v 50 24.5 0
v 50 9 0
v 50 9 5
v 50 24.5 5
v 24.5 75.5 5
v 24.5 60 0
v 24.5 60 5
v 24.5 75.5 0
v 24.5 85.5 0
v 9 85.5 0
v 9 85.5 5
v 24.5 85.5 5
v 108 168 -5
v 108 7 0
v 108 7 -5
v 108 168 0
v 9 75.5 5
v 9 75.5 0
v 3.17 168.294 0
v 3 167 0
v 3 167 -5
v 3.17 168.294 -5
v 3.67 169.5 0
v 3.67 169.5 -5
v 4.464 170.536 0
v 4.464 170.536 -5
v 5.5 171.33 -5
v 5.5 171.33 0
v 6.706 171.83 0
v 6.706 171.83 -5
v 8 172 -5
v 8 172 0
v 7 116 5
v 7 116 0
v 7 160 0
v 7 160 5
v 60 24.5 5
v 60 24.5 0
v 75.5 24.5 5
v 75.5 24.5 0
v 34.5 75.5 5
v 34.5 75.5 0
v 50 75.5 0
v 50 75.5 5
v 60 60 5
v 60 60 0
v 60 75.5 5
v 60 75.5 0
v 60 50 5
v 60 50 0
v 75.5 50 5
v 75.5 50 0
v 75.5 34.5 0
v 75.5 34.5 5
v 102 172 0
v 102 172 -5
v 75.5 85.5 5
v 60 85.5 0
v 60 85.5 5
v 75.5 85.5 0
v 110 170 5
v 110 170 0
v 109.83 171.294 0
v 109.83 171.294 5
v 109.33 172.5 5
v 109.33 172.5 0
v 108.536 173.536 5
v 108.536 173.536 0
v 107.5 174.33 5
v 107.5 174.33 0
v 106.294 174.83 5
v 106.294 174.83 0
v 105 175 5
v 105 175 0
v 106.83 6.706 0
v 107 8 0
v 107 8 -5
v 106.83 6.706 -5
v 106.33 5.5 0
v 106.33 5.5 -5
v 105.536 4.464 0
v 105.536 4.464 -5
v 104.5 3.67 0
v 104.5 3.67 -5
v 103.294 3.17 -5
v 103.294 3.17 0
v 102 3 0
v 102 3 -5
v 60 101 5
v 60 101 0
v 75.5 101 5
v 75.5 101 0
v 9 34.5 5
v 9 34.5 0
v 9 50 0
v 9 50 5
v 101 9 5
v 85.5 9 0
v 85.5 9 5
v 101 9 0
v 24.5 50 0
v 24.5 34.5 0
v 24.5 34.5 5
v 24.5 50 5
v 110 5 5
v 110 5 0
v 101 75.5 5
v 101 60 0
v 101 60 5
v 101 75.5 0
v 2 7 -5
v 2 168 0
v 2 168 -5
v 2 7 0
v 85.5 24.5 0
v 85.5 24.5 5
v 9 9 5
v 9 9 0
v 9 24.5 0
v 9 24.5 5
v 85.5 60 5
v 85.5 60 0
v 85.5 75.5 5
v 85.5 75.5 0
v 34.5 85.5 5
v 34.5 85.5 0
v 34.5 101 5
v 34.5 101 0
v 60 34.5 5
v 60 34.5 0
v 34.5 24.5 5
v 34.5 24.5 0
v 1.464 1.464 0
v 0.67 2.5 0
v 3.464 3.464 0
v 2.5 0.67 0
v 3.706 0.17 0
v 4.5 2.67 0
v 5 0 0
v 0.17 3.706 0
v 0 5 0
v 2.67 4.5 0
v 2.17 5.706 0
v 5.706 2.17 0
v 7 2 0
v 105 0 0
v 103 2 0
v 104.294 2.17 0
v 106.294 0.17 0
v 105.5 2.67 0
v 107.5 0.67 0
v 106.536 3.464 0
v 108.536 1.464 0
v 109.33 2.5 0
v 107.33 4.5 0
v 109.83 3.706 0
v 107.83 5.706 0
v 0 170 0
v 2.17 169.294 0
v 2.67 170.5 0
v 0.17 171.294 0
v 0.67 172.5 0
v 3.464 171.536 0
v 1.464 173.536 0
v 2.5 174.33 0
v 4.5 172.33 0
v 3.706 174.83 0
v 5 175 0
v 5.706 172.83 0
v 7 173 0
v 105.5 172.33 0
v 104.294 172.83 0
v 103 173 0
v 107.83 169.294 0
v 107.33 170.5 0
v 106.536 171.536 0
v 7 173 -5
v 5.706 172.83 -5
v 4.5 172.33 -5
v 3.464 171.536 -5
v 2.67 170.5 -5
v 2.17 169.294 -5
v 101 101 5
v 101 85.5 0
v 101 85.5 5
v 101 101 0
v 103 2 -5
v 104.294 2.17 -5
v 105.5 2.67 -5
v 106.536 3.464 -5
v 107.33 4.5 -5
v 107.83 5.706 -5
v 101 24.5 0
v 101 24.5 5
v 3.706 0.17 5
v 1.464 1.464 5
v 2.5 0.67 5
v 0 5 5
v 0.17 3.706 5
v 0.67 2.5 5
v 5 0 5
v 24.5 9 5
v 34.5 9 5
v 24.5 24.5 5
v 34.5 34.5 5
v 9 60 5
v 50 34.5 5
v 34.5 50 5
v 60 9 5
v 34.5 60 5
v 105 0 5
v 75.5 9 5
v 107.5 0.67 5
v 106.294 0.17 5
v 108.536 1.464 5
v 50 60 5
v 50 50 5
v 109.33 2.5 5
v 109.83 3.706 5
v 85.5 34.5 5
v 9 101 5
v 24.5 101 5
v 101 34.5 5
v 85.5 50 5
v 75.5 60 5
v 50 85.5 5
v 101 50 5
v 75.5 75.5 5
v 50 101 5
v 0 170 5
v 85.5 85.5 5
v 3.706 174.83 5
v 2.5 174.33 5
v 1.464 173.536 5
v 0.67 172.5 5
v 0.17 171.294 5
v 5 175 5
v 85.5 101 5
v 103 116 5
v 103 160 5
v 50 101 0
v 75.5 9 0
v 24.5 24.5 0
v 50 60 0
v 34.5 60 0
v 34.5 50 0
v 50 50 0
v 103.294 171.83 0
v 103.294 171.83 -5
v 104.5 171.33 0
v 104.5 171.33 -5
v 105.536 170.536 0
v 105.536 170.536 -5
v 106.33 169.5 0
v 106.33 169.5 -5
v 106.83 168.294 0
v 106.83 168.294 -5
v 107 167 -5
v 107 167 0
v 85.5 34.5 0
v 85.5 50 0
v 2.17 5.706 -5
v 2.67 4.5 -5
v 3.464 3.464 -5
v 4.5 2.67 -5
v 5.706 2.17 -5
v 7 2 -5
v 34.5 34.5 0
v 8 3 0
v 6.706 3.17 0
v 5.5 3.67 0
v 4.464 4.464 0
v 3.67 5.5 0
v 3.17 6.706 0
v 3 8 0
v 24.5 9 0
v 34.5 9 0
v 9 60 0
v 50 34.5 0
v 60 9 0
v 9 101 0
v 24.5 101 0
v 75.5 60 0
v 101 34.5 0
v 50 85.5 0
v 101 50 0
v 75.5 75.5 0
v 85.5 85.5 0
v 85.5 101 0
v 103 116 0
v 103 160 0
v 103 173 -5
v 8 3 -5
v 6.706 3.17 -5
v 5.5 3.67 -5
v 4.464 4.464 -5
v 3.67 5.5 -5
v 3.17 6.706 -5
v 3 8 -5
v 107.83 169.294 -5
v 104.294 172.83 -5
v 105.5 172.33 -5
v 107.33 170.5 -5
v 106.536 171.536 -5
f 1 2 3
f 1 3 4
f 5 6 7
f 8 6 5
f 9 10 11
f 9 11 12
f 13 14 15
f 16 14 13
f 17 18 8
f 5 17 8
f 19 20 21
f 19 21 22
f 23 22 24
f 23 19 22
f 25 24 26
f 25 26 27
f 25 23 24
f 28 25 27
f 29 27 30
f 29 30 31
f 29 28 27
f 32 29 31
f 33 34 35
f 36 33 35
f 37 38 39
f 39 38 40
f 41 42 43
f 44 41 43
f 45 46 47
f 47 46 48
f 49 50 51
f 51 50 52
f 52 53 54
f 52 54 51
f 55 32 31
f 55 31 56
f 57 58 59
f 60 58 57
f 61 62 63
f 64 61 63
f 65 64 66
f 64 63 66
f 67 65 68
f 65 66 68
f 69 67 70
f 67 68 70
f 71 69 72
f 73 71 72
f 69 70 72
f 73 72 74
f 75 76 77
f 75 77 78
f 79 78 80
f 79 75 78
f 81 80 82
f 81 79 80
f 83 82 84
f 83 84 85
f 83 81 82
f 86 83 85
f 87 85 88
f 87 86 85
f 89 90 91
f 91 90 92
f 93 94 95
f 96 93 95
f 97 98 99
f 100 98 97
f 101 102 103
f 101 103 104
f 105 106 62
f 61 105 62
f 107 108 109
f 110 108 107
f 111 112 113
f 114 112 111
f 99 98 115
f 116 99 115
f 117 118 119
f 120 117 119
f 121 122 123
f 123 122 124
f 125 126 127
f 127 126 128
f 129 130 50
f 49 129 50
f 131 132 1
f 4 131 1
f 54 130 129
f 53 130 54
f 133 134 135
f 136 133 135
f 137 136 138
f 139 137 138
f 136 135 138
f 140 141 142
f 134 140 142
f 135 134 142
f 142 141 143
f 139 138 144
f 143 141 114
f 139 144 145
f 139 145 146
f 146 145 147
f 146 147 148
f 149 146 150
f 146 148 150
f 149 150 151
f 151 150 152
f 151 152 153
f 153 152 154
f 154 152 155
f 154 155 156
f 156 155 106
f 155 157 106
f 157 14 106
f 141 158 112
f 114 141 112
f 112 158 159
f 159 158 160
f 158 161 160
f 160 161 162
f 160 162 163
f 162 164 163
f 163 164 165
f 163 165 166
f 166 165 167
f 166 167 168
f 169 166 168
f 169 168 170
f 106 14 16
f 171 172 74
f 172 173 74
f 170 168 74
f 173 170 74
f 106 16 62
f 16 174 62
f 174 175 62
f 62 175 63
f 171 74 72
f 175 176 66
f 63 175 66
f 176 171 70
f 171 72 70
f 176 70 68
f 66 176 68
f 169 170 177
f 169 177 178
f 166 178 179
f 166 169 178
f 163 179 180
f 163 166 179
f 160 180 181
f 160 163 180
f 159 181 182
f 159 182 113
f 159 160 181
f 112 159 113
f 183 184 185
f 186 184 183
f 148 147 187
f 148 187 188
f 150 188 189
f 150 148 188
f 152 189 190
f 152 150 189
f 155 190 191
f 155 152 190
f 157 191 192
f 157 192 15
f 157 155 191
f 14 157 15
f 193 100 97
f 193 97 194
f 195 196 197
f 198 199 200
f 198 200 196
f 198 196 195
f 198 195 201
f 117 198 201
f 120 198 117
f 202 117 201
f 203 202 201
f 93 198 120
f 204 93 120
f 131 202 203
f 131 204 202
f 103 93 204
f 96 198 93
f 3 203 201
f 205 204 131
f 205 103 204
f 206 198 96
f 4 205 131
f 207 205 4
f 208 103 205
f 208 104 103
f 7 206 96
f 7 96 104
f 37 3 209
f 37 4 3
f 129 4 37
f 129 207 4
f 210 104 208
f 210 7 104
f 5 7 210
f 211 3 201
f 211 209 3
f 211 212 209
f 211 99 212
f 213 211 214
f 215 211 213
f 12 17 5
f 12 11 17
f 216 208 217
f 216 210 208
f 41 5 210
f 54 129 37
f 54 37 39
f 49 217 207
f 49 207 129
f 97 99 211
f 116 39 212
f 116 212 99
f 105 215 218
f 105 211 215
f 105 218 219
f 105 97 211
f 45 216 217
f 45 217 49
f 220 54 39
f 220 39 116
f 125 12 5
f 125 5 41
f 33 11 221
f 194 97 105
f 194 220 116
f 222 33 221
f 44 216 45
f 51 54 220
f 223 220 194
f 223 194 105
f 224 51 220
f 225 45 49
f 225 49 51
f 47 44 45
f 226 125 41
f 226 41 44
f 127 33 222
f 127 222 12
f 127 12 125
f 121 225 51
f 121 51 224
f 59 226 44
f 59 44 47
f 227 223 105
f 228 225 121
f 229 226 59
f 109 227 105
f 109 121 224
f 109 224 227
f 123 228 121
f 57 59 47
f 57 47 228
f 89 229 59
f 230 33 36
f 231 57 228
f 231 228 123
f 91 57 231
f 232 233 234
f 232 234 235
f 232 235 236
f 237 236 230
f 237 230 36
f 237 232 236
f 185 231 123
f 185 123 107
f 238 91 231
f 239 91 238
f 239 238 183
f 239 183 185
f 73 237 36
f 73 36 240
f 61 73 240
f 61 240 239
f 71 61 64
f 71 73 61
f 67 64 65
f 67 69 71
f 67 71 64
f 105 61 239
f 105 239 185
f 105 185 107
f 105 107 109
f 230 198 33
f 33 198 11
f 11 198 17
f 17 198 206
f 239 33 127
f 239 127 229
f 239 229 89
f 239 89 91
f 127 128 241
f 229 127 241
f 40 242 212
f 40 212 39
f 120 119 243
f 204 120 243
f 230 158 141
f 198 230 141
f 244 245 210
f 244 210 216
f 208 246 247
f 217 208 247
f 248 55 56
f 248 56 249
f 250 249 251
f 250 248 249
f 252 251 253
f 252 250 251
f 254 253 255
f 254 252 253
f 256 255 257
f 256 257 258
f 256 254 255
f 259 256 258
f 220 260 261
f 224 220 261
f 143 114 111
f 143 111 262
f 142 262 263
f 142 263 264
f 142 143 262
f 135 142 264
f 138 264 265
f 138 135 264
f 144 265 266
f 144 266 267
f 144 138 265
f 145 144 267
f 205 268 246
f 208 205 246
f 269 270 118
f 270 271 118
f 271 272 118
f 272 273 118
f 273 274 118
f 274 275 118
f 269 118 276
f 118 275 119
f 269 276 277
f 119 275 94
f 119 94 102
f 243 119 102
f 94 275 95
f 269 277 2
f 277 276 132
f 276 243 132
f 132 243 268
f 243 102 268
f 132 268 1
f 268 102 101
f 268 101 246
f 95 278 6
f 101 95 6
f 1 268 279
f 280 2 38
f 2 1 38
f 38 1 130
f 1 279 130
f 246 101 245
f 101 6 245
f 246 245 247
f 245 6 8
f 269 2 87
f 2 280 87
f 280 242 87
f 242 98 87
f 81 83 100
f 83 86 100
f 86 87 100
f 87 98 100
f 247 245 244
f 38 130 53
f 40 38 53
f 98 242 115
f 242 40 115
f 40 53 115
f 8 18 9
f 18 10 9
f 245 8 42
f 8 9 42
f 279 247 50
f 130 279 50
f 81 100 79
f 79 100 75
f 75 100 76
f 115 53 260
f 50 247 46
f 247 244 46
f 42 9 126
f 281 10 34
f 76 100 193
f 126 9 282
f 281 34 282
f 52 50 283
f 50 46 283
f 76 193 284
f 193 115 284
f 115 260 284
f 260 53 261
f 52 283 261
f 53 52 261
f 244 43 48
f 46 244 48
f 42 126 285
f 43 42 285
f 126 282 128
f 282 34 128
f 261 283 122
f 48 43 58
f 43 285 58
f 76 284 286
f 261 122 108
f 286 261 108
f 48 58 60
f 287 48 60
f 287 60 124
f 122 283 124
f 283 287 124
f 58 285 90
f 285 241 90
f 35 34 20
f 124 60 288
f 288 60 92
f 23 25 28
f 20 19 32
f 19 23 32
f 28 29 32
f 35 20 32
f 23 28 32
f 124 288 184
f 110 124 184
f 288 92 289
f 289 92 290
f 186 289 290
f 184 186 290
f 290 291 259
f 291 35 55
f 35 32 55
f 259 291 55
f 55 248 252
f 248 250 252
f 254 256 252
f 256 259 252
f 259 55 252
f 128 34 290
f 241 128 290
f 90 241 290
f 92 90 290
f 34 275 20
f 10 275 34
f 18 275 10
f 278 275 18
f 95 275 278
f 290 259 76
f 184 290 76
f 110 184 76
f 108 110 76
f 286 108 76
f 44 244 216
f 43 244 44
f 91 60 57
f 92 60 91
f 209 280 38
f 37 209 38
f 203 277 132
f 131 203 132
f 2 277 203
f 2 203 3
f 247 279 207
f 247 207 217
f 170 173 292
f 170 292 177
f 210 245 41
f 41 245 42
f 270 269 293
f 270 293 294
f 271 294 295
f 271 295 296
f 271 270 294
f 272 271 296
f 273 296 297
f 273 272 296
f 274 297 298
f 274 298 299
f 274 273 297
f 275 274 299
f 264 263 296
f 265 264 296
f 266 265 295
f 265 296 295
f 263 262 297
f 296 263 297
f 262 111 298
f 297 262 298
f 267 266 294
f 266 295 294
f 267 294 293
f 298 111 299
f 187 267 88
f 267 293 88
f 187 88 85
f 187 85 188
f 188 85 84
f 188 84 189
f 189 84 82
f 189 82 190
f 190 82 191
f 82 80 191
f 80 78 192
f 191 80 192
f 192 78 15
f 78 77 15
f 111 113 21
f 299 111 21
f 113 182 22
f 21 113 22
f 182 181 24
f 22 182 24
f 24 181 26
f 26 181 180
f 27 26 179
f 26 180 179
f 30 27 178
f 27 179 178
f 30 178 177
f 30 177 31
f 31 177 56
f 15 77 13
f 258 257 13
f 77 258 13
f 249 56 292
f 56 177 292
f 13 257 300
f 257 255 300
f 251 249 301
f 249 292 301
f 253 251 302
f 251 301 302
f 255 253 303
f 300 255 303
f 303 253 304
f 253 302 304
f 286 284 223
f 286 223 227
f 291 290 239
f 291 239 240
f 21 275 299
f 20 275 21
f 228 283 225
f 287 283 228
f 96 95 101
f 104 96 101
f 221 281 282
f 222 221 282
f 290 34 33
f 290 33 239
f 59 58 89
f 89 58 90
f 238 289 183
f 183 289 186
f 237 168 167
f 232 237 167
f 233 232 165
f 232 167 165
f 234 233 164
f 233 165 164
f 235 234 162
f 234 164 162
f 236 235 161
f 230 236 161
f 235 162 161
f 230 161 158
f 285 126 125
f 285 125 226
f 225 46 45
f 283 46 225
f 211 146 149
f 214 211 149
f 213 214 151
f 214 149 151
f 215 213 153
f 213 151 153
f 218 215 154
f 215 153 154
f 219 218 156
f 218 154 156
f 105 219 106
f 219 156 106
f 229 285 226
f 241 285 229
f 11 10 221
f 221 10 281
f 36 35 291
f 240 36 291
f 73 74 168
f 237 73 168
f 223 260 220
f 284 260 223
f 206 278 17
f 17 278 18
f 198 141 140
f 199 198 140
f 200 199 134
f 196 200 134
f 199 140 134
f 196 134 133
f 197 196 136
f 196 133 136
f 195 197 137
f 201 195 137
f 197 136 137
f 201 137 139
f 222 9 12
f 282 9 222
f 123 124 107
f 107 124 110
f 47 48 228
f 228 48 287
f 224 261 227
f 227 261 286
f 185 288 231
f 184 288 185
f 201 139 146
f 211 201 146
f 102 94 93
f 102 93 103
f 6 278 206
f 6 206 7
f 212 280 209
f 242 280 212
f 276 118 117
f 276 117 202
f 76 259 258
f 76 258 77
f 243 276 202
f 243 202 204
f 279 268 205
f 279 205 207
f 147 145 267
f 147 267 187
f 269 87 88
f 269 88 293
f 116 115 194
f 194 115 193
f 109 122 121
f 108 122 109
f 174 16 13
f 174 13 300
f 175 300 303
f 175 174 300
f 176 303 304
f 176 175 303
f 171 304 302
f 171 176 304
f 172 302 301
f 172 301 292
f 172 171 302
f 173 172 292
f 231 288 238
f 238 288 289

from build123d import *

# Parameters (mm, degrees)
F0_W     = 15.5
F0_H     = 15.5
F0_W_2   = 96
F0_H_2   = 44
F1_DEPTH = 5
F3_DEPTH = 5


with BuildPart() as f1:
    # F0 (on Top) → F1 (new body)
    with BuildSketch(Plane.XY):
        with BuildLine():
            ThreePointArc((0, 5), (1.464466, 1.464466), (5, 0))
            Line((5, 0), (105, 0))
            ThreePointArc((105, 0), (108.535534, 1.464466), (110, 5))
            Line((110, 5), (110, 170))
            ThreePointArc((110, 170), (108.535534, 173.535534), (105, 175))
            Line((105, 175), (5, 175))
            ThreePointArc((5, 175), (1.464466, 173.535534), (0, 170))
            Line((0, 170), (0, 5))
        make_face()
        with Locations((16.75, 16.75)):
            Rectangle(F0_W, F0_H, mode=Mode.SUBTRACT)
        with Locations((16.75, 42.25)):
            Rectangle(F0_W, F0_H, mode=Mode.SUBTRACT)
        with Locations((42.25, 16.75)):
            Rectangle(F0_W, F0_H, mode=Mode.SUBTRACT)
        with Locations((42.25, 42.25)):
            Rectangle(F0_W, F0_H, mode=Mode.SUBTRACT)
        with Locations((16.75, 67.75)):
            Rectangle(F0_W, F0_H, mode=Mode.SUBTRACT)
        with Locations((42.25, 67.75)):
            Rectangle(F0_W, F0_H, mode=Mode.SUBTRACT)
        with Locations((67.75, 16.75)):
            Rectangle(F0_W, F0_H, mode=Mode.SUBTRACT)
        with Locations((67.75, 42.25)):
            Rectangle(F0_W, F0_H, mode=Mode.SUBTRACT)
        with Locations((93.25, 16.75)):
            Rectangle(F0_W, F0_H, mode=Mode.SUBTRACT)
        with Locations((93.25, 42.25)):
            Rectangle(F0_W, F0_H, mode=Mode.SUBTRACT)
        with Locations((67.75, 67.75)):
            Rectangle(F0_W, F0_H, mode=Mode.SUBTRACT)
        with Locations((93.25, 67.75)):
            Rectangle(F0_W, F0_H, mode=Mode.SUBTRACT)
        with Locations((16.75, 93.25)):
            Rectangle(F0_W, F0_H, mode=Mode.SUBTRACT)
        with Locations((42.25, 93.25)):
            Rectangle(F0_W, F0_H, mode=Mode.SUBTRACT)
        with Locations((67.75, 93.25)):
            Rectangle(F0_W, F0_H, mode=Mode.SUBTRACT)
        with Locations((93.25, 93.25)):
            Rectangle(F0_W, F0_H, mode=Mode.SUBTRACT)
        with Locations((55, 138)):
            Rectangle(F0_W_2, F0_H_2, mode=Mode.SUBTRACT)
    extrude(amount=F1_DEPTH)

    # F2 (on face) → F3 (join)
    with BuildSketch(Plane.XY):
        with BuildLine():
            ThreePointArc((108, 168), (106.535534, 171.535534), (103, 173))
            Line((103, 173), (7, 173))
            ThreePointArc((7, 173), (3.464466, 171.535534), (2, 168))
            Line((2, 168), (2, 7))
            ThreePointArc((2, 7), (3.464466, 3.464466), (7, 2))
            Line((7, 2), (103, 2))
            ThreePointArc((103, 2), (106.535534, 3.464466), (108, 7))
            Line((108, 7), (108, 168))
        make_face()
        with BuildLine():
            Line((8, 172), (102, 172))
            ThreePointArc((102, 172), (105.535534, 170.535534), (107, 167))
            Line((107, 167), (107, 8))
            ThreePointArc((107, 8), (105.535534, 4.464466), (102, 3))
            Line((102, 3), (8, 3))
            ThreePointArc((8, 3), (4.464466, 4.464466), (3, 8))
            Line((3, 8), (3, 167))
            ThreePointArc((3, 167), (4.464466, 170.535534), (8, 172))
        make_face(mode=Mode.SUBTRACT)
    extrude(amount=-F3_DEPTH)


solid = f1.part
